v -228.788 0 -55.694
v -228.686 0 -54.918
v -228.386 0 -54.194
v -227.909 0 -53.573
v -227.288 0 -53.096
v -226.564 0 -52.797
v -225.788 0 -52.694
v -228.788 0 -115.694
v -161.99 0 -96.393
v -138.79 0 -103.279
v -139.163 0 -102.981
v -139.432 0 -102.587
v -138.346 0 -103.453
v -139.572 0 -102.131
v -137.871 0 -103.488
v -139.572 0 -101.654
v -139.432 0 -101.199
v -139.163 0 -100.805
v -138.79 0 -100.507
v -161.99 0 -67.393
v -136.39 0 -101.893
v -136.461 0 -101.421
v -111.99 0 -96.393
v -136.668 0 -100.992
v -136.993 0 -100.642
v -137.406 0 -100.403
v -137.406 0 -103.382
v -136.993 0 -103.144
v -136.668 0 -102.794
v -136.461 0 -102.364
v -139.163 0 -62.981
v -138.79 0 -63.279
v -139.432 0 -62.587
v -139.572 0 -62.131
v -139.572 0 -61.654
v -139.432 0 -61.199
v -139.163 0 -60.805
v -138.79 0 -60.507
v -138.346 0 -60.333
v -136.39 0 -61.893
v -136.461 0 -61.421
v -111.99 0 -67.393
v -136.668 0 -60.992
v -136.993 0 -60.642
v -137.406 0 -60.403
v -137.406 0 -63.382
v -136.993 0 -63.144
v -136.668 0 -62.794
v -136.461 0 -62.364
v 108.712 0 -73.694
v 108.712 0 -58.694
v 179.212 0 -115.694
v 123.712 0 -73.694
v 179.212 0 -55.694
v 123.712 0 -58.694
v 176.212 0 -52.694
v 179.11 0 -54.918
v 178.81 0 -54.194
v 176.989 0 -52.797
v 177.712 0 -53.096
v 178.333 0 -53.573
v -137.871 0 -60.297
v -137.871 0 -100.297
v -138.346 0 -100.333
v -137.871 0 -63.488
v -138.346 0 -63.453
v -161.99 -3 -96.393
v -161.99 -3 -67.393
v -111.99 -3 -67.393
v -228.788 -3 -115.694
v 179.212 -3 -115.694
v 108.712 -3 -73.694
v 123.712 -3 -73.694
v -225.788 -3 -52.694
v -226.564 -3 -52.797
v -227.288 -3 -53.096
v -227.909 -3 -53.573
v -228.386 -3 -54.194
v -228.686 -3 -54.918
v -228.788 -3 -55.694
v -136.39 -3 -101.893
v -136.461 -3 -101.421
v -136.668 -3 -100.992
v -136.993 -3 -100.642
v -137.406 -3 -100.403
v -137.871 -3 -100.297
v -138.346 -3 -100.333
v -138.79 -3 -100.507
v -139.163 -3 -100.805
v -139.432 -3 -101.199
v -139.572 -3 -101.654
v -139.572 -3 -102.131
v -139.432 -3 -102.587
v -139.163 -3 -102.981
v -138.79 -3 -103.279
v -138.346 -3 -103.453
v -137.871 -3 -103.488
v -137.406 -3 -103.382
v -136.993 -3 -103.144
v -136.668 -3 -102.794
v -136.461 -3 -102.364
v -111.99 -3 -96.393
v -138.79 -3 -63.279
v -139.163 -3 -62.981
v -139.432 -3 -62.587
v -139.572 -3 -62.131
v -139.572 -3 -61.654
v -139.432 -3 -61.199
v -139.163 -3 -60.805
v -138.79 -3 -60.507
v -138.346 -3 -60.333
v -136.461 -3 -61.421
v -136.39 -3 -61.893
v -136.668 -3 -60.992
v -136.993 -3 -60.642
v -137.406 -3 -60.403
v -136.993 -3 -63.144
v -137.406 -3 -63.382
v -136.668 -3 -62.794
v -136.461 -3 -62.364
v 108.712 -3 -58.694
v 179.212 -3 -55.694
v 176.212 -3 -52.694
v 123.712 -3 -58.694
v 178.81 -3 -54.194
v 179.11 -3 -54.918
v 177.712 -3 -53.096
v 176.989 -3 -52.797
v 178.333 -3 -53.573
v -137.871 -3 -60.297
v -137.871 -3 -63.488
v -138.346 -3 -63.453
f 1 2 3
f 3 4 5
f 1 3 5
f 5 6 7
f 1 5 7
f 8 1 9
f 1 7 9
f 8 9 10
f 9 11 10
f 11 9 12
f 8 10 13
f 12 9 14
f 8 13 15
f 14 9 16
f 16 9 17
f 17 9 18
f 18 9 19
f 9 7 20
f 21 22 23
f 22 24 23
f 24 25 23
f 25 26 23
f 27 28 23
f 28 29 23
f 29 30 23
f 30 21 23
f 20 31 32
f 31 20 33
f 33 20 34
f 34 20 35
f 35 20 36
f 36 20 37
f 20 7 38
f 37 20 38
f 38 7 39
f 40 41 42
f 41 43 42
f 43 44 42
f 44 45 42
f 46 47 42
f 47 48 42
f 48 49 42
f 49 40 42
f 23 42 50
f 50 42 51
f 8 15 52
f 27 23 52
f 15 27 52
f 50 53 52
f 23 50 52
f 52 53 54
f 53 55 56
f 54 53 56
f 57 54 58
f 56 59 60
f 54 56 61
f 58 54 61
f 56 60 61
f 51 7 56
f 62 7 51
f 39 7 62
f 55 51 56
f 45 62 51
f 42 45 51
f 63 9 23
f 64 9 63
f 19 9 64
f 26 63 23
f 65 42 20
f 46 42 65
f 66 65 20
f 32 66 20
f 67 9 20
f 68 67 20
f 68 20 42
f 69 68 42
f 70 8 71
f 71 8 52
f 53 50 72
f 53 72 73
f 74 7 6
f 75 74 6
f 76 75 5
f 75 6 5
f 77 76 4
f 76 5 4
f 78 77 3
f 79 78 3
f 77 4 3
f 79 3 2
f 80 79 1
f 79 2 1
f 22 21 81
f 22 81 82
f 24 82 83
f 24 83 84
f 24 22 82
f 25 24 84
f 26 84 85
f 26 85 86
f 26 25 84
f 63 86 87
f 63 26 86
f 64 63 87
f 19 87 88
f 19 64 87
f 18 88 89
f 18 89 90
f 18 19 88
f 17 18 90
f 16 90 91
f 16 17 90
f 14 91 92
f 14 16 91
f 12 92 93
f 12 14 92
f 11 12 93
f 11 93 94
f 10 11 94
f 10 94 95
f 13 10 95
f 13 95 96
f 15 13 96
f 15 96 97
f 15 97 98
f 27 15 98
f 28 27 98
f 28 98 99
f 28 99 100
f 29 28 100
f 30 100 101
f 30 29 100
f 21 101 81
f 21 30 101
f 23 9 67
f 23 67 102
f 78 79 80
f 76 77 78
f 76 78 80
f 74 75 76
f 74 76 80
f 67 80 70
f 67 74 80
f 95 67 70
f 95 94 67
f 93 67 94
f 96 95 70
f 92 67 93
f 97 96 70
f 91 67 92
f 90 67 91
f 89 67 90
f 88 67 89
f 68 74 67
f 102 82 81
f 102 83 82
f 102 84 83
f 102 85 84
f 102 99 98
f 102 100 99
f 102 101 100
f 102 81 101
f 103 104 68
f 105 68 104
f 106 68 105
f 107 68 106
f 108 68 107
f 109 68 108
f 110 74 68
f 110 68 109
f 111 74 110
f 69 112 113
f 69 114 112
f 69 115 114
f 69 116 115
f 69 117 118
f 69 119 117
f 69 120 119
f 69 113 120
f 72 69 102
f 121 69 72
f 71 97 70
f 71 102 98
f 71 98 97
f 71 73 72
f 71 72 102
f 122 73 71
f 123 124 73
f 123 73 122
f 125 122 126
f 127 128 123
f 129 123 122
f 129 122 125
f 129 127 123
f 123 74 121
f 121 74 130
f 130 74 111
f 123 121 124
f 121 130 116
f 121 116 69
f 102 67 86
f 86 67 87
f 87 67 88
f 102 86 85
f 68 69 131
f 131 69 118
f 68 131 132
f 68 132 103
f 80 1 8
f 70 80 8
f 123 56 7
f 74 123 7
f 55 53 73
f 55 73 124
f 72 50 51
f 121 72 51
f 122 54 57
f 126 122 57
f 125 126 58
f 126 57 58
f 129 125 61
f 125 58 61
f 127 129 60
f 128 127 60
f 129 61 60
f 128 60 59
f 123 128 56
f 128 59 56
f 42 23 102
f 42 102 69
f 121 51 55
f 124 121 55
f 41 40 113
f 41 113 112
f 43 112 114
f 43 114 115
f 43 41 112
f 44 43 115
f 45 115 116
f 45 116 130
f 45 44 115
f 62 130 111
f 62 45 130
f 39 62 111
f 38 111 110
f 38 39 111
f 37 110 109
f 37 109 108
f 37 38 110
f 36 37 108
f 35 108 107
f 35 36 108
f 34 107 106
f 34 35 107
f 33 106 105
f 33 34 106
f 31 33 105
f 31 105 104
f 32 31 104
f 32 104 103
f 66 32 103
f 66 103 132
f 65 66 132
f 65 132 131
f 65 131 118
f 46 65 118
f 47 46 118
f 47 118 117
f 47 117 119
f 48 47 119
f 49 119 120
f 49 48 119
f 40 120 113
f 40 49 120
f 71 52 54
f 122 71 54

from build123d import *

# Parameters (mm, degrees)
F0_R     = 1.6
F0_W     = 50
F0_H     = 29
F0_W_2   = 15
F0_H_2   = 15
F1_DEPTH = 3


with BuildPart() as f1:
    # F0 (on Front) → F1 (new body)
    with BuildSketch(Plane.XZ):
        with BuildLine():
            Line((176.212173, -52.694491), (-225.787827, -52.694491))
            ThreePointArc((-225.787827, -52.694491), (-227.909148, -53.57317), (-228.787827, -55.694491))
            Line((-228.787827, -55.694491), (-228.787827, -115.694491))
            Line((-228.787827, -115.694491), (179.212173, -115.694491))
            Line((179.212173, -115.694491), (179.212173, -55.694491))
            ThreePointArc((179.212173, -55.694491), (178.333493, -53.57317), (176.212173, -52.694491))
        make_face()
        with Locations((-137.990355, -101.892883)):
            Circle(F0_R, mode=Mode.SUBTRACT)
        with Locations((-136.990355, -81.892883)):
            Rectangle(F0_W, F0_H, mode=Mode.SUBTRACT)
        with Locations((-137.990355, -61.892883)):
            Circle(F0_R, mode=Mode.SUBTRACT)
        with Locations((116.212173, -66.194491)):
            Rectangle(F0_W_2, F0_H_2, mode=Mode.SUBTRACT)
    extrude(amount=F1_DEPTH)


solid = f1.part
